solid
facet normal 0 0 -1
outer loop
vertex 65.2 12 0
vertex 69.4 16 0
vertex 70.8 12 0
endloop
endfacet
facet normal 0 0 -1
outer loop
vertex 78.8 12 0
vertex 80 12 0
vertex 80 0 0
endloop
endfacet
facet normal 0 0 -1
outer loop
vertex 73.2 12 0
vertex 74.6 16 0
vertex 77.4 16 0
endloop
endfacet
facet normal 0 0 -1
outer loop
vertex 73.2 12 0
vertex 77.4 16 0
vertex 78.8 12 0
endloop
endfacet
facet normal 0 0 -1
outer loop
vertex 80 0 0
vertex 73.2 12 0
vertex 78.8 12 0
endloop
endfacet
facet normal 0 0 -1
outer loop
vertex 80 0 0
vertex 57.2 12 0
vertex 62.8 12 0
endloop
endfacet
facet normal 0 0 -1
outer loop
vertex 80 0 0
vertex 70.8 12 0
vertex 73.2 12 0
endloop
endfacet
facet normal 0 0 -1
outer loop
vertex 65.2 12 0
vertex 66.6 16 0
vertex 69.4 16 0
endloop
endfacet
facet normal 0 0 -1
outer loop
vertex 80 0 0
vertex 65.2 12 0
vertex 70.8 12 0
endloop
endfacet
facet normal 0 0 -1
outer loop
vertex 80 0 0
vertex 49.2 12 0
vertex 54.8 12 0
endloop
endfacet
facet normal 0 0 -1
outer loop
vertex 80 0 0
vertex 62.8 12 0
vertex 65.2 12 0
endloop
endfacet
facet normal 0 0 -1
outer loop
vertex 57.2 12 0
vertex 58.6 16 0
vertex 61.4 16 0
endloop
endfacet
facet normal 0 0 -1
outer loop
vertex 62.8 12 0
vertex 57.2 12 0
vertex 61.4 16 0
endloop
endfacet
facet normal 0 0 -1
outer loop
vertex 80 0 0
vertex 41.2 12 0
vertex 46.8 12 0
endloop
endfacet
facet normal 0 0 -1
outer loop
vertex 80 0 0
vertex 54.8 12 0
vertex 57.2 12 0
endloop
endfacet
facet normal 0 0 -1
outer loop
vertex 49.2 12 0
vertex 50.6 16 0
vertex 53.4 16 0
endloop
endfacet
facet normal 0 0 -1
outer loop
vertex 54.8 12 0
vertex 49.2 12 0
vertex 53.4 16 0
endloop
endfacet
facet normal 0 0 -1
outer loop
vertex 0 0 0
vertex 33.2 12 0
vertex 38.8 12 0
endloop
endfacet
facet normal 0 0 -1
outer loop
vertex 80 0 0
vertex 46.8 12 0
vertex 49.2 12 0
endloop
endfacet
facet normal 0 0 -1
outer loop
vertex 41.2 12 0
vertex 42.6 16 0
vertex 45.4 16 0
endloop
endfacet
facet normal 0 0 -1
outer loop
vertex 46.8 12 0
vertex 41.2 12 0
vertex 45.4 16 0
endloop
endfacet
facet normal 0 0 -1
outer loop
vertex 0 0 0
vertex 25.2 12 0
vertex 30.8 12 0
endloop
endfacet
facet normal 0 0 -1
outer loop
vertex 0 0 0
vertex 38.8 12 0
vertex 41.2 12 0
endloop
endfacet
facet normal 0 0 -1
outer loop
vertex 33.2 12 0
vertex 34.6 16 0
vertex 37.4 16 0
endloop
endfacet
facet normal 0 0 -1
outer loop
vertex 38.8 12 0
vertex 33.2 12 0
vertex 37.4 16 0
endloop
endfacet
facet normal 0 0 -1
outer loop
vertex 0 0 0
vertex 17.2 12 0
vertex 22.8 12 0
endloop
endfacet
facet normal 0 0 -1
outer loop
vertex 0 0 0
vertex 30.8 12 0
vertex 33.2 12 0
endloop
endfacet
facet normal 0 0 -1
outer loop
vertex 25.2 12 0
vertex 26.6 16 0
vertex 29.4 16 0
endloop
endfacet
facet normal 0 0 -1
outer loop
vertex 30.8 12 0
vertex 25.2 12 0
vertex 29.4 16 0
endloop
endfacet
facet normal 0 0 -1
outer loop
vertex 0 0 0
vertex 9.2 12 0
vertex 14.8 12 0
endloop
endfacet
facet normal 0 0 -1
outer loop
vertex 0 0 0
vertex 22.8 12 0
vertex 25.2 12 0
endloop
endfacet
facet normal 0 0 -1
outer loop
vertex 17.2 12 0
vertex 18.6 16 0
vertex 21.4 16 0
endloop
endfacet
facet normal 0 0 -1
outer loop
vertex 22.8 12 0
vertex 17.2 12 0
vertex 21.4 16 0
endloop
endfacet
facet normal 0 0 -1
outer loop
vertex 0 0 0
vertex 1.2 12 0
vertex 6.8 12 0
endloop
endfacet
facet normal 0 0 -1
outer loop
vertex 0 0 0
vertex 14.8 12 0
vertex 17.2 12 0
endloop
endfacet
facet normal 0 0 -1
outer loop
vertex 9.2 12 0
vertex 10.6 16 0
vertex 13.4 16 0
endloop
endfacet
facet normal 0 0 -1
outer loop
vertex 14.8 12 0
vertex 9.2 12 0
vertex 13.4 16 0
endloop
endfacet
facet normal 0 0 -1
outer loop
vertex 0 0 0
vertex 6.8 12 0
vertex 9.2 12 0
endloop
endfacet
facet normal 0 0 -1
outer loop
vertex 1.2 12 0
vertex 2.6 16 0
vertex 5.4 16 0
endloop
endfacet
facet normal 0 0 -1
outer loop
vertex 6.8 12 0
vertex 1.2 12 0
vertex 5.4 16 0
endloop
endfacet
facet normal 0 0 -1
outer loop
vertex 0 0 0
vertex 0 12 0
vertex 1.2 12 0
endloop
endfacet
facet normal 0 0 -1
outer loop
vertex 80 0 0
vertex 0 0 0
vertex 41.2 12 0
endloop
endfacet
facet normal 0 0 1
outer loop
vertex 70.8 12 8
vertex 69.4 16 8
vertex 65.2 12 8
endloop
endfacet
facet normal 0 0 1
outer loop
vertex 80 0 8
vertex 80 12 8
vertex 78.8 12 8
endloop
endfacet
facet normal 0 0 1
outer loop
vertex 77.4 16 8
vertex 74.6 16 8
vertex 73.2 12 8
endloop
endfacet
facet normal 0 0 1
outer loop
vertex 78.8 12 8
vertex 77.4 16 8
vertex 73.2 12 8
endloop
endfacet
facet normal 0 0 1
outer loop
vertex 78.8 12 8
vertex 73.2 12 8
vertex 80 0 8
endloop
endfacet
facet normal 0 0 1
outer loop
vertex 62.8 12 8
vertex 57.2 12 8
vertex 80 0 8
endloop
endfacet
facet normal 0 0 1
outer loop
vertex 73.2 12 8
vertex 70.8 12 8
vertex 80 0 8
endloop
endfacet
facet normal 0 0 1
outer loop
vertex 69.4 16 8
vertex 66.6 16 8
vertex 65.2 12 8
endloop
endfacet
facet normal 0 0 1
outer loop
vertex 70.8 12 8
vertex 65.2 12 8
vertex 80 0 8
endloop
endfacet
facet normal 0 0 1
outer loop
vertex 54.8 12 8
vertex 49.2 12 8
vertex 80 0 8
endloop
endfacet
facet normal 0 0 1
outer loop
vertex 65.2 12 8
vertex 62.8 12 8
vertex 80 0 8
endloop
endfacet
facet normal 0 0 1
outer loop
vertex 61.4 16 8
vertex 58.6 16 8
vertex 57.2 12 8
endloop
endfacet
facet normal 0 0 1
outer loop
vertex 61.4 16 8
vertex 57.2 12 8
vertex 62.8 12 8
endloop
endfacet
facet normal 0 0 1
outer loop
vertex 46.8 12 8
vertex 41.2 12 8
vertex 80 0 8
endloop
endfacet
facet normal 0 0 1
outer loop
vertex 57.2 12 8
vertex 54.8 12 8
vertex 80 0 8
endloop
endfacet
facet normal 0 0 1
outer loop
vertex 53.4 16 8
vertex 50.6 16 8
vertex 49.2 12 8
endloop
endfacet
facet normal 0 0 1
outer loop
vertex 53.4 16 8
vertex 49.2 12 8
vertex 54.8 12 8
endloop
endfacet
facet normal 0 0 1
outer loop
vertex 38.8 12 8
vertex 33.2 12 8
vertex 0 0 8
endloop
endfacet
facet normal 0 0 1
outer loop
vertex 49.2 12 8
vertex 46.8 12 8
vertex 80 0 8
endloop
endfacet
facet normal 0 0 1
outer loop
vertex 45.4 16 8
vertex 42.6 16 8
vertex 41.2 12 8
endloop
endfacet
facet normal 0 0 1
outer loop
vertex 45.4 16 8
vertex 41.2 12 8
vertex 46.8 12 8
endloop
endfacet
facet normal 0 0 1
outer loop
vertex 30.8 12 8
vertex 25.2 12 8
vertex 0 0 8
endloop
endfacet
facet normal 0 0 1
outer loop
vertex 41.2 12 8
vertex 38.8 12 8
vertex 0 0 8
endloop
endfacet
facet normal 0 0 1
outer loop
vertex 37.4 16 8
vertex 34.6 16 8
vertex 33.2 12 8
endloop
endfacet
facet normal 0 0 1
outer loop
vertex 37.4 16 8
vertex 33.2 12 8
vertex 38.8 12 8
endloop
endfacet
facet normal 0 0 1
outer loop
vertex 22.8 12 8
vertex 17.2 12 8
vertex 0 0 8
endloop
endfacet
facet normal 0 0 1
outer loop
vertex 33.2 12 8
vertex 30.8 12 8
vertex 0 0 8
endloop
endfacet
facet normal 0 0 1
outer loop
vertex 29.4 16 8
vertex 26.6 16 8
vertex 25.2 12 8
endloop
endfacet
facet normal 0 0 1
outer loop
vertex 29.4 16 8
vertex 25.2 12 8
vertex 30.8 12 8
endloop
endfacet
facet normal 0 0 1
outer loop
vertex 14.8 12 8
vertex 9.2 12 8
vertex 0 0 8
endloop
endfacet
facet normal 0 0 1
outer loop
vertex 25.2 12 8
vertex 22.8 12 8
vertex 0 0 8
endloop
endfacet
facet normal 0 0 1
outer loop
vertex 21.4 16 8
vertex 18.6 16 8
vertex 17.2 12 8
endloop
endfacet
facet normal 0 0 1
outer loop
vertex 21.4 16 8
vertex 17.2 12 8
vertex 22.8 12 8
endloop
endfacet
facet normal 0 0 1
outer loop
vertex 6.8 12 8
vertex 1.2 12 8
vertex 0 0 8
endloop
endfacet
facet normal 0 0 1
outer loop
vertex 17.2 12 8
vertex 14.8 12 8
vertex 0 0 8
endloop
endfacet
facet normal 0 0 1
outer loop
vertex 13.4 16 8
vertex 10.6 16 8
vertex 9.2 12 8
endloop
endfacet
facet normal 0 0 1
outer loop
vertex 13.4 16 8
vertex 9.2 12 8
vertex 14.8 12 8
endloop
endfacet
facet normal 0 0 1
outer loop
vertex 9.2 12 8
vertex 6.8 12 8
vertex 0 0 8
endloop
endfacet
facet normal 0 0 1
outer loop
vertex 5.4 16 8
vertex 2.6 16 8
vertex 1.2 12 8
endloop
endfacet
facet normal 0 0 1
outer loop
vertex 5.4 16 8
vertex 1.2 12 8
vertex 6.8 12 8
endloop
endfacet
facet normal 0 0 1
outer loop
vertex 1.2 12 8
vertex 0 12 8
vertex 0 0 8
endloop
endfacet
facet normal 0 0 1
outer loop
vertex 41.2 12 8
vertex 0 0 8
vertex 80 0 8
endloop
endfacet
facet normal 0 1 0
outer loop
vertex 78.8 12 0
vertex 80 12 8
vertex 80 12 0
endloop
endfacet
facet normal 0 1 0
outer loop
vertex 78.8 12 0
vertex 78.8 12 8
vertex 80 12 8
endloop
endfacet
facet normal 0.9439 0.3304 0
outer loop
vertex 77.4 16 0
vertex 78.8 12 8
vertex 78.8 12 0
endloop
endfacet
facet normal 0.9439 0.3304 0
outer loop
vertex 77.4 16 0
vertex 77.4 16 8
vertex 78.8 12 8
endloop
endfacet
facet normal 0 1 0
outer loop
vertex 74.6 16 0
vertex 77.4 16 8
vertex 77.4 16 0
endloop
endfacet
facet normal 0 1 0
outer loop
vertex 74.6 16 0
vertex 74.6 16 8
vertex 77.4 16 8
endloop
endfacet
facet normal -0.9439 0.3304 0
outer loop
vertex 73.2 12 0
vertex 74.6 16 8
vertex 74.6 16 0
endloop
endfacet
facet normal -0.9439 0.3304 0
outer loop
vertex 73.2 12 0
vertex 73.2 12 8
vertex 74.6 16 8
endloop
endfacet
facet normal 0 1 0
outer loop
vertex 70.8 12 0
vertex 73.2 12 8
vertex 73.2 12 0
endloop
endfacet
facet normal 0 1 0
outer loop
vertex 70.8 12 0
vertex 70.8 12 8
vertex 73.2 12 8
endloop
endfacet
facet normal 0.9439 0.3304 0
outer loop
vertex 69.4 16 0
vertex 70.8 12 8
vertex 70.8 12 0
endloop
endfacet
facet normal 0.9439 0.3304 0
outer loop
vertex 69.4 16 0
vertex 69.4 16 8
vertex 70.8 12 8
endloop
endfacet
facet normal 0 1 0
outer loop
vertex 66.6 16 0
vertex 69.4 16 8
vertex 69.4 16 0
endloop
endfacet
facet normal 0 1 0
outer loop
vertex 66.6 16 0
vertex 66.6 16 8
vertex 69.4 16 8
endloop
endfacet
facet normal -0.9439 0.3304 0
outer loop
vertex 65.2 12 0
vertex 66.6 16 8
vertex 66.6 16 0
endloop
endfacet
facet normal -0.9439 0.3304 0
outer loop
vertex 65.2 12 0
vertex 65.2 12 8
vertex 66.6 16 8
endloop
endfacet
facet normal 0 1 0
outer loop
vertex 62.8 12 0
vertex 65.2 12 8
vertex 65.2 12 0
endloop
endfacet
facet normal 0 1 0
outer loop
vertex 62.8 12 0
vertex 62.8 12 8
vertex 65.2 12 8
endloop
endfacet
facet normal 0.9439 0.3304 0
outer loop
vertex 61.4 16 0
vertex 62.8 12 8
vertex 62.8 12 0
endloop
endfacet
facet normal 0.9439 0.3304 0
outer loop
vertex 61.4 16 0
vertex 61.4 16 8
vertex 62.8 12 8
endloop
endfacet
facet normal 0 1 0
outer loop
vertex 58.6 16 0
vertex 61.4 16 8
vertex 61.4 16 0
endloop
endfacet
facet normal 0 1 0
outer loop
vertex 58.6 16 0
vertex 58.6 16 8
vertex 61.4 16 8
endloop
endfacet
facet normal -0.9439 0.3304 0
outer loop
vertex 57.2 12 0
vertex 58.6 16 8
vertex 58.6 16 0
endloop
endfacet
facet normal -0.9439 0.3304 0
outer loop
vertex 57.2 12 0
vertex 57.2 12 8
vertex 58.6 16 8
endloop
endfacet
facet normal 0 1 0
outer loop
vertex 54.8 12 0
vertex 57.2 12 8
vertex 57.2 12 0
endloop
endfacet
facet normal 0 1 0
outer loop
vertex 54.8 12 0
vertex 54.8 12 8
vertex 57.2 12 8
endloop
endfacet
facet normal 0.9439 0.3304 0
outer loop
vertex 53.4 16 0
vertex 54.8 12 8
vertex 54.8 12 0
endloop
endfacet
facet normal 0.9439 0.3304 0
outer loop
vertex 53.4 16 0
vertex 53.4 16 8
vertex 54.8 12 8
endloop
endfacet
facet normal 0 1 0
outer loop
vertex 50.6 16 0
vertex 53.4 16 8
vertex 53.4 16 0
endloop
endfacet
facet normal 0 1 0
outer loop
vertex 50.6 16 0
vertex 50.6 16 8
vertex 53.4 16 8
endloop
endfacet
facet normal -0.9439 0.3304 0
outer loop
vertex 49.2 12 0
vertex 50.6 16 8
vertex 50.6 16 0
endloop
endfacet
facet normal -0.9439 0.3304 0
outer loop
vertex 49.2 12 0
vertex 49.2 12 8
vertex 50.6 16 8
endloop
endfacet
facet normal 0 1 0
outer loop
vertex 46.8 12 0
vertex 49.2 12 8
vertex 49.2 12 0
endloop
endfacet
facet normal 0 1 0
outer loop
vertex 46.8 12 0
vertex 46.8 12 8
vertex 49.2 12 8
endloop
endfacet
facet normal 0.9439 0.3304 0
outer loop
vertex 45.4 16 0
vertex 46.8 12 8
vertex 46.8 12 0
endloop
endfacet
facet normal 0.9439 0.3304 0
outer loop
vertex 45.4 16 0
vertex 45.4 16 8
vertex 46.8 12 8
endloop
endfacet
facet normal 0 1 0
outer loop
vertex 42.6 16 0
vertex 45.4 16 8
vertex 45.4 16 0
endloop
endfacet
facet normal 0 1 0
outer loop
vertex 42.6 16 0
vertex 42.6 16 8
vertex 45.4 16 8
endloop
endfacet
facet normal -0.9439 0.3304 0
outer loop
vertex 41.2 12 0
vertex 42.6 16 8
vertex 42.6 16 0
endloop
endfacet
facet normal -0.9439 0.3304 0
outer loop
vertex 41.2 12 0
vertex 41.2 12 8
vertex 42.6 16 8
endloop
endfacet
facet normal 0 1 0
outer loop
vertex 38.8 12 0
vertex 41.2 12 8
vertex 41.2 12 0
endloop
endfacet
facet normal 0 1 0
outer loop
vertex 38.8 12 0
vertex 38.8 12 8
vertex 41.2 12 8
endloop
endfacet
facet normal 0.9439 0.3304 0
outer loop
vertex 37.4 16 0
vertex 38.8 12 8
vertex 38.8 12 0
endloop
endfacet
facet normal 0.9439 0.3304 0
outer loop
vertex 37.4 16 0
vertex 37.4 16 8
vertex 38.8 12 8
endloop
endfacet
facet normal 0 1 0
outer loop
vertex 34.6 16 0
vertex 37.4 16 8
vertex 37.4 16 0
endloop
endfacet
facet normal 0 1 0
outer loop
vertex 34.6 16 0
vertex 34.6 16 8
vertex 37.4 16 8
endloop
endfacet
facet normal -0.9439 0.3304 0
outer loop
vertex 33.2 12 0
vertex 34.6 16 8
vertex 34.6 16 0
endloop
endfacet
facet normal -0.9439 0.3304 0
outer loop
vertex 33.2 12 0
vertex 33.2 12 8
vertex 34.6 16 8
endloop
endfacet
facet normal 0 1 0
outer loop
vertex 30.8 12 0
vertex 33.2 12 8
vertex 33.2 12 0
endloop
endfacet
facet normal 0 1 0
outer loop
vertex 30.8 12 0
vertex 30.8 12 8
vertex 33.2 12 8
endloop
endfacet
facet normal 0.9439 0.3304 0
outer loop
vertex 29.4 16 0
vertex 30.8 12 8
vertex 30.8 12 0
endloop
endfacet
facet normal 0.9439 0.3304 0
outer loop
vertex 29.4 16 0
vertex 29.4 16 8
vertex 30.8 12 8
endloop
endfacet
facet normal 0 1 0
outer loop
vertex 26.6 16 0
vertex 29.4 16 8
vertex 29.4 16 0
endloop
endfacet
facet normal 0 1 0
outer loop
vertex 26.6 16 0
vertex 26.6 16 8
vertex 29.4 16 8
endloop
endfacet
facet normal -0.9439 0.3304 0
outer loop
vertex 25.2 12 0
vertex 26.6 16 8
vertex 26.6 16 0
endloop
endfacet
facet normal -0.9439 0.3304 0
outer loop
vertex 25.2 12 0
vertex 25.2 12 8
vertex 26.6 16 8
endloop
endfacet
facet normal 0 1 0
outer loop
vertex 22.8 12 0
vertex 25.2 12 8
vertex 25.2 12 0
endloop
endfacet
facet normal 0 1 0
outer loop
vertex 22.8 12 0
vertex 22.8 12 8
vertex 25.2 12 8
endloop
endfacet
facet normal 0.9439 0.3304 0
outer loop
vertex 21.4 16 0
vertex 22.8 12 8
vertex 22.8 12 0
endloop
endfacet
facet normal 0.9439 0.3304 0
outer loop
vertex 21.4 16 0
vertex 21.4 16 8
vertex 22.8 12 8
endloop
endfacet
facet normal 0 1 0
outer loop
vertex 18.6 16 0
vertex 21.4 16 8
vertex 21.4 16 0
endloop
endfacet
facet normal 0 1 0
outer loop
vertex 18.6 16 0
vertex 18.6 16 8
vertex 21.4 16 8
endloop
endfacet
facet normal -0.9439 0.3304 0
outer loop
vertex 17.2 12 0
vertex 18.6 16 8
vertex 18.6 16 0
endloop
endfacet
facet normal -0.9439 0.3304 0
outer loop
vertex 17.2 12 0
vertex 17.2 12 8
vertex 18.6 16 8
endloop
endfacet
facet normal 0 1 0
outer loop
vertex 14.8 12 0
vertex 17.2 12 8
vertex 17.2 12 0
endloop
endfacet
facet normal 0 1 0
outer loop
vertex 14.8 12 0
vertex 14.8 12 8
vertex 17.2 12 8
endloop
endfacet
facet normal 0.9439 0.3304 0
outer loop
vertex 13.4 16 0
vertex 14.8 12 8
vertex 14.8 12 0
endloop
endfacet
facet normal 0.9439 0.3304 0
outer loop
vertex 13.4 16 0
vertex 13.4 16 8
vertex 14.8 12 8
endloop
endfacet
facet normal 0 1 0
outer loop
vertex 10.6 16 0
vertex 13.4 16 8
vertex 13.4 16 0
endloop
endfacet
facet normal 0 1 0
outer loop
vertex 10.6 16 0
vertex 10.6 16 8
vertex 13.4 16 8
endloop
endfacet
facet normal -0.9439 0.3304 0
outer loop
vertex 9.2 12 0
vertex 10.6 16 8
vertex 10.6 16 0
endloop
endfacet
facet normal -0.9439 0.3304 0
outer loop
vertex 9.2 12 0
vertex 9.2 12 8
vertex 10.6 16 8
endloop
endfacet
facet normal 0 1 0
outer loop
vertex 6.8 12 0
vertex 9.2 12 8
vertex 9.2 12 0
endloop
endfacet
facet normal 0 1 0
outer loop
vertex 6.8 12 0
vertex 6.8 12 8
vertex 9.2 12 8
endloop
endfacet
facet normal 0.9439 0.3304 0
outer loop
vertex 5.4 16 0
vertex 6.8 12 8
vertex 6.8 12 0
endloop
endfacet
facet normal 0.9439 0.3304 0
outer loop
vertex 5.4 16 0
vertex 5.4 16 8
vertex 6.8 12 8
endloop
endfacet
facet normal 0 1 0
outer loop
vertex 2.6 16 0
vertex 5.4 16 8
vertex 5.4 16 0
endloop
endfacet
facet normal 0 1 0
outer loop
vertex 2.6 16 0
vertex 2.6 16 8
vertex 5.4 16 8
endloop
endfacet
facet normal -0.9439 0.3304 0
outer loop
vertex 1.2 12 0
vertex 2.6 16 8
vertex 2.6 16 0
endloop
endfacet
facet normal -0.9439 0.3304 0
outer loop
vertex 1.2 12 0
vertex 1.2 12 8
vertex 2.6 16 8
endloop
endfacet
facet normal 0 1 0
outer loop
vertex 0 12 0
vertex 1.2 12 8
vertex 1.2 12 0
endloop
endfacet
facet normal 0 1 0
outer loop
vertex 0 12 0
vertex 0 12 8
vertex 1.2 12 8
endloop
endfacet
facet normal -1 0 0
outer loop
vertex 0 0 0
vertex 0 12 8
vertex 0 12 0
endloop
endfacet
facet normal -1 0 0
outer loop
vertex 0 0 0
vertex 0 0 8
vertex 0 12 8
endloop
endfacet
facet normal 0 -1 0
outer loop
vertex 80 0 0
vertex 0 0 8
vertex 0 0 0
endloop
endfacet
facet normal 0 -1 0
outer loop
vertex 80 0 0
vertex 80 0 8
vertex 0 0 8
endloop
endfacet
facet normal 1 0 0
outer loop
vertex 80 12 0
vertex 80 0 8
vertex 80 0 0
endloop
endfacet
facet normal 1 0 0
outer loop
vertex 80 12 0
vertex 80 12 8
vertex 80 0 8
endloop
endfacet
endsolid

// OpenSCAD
$fn = 32;

// ----------------------------------------------------------------------
// Gear rack: 10 teeth, pitch 8 mm
// ----------------------------------------------------------------------

// --- parameters (mm) ---
teeth = 10;               // number of teeth
pitch = 8;                // tooth pitch, X
root_w = 5.6;             // tooth width at the root
tip_w = 2.8;              // tooth width at the tip
base_h = 12;              // rack body height, Y
tooth_h = 4;              // tooth height above the body
plate_t = 8;              // rack width, Z (extrusion height)

rack_l = teeth * pitch;  // overall length
total_h = base_h + tooth_h;  // overall height

profile = [[0, 0], [80, 0], [80, 12], [78.8, 12], [77.4, 16], [74.6, 16], [73.2, 12], [70.8, 12], [69.4, 16], [66.6, 16], [65.2, 12], [62.8, 12], [61.4, 16], [58.6, 16], [57.2, 12], [54.8, 12], [53.4, 16], [50.6, 16], [49.2, 12], [46.8, 12], [45.4, 16], [42.6, 16], [41.2, 12], [38.8, 12], [37.4, 16], [34.6, 16], [33.2, 12], [30.8, 12], [29.4, 16], [26.6, 16], [25.2, 12], [22.8, 12], [21.4, 16], [18.6, 16], [17.2, 12], [14.8, 12], [13.4, 16], [10.6, 16], [9.2, 12], [6.8, 12], [5.4, 16], [2.6, 16], [1.2, 12], [0, 12]];  // primary outline, 44 points, counter clockwise

// --- the one profile operation ---
linear_extrude(height = plate_t) polygon(points = profile);
